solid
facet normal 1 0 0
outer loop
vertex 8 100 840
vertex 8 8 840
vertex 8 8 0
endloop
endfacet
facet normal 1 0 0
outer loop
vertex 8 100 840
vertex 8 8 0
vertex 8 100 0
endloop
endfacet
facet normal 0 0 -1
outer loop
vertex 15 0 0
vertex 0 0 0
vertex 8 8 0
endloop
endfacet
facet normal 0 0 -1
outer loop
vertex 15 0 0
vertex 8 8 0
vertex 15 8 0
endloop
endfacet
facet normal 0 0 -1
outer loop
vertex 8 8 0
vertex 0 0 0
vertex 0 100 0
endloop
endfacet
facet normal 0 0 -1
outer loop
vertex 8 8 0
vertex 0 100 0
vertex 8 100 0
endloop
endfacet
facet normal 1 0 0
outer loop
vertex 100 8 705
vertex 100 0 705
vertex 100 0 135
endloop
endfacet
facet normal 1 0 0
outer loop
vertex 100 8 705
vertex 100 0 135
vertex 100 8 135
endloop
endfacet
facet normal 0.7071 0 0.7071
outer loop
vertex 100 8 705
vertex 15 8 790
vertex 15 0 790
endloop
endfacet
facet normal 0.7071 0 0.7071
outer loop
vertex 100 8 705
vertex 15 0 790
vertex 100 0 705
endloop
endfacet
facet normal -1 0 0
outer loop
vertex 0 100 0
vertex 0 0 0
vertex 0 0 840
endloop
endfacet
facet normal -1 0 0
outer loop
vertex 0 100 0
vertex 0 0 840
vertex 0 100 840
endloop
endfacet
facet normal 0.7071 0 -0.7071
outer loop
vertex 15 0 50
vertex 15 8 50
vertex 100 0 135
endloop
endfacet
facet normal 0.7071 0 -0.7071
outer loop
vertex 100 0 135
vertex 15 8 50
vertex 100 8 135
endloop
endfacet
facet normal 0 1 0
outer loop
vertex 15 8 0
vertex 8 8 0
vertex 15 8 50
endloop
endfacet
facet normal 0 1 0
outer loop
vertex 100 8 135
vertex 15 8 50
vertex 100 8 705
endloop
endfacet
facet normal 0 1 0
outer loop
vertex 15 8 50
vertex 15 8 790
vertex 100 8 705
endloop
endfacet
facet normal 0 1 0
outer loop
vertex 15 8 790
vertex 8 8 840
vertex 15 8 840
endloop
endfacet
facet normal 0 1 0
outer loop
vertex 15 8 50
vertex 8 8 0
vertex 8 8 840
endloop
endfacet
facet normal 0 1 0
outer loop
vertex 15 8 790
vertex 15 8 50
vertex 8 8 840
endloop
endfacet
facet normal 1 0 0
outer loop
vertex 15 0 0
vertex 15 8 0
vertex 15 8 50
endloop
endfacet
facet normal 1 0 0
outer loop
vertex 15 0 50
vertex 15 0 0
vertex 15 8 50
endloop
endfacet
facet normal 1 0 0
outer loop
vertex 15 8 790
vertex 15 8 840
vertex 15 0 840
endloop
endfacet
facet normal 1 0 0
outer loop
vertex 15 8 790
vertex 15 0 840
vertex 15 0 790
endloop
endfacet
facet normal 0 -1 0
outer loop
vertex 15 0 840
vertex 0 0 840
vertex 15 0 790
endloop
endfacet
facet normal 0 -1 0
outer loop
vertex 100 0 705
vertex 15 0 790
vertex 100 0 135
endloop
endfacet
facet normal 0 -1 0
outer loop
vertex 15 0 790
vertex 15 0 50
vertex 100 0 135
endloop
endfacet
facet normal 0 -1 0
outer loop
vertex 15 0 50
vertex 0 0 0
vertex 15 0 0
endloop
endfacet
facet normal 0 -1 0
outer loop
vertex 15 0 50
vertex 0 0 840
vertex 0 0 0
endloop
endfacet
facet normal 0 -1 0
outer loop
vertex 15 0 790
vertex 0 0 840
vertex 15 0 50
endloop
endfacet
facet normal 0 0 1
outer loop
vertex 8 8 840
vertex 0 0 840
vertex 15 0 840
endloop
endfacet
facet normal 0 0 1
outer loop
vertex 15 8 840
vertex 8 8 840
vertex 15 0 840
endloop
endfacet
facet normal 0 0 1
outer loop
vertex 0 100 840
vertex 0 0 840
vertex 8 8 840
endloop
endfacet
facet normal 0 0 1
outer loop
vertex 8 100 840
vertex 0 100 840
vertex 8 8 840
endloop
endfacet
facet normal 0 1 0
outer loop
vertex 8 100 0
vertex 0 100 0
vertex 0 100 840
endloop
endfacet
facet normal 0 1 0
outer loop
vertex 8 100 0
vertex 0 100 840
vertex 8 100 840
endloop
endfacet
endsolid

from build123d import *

# Parameters (mm, degrees)
SKETCH_1_W          = 100
SKETCH_1_H          = 100
EXTRUDE_1_DEPTH     = 840
SKETCH_2_W          = 92
SKETCH_2_H          = 92
CUT_EXTRUDE_1_DEPTH = 852.821577562
CUT_EXTRUDE_3_DEPTH = 851.919502656


with BuildPart() as part:
    # 草图1 → 凸台-拉伸1 (new body)
    with BuildSketch(Plane.XY):
        with Locations((50, 50)):
            Rectangle(SKETCH_1_W, SKETCH_1_H)
    extrude(amount=EXTRUDE_1_DEPTH)

    # 草图2 → 切除-拉伸1 (cut, through all)
    with BuildSketch(Plane.XY.offset(840)):
        with Locations((54, 54)):
            Rectangle(SKETCH_2_W, SKETCH_2_H)
    extrude(amount=-CUT_EXTRUDE_1_DEPTH, mode=Mode.SUBTRACT)

    # 草图4 → 切除-拉伸3 (cut, through all)
    with BuildSketch(Plane(origin=(0, 8, 0), x_dir=(1, 0, 0), z_dir=(0, 1, 0))):
        Polygon((15, 0), (15, -50), (100, -135), (100, 0), align=None)
        Polygon((15, -840), (15, -790), (100, -705), (100, -840), align=None)
    extrude(amount=-CUT_EXTRUDE_3_DEPTH, mode=Mode.SUBTRACT)


solid = part.part
